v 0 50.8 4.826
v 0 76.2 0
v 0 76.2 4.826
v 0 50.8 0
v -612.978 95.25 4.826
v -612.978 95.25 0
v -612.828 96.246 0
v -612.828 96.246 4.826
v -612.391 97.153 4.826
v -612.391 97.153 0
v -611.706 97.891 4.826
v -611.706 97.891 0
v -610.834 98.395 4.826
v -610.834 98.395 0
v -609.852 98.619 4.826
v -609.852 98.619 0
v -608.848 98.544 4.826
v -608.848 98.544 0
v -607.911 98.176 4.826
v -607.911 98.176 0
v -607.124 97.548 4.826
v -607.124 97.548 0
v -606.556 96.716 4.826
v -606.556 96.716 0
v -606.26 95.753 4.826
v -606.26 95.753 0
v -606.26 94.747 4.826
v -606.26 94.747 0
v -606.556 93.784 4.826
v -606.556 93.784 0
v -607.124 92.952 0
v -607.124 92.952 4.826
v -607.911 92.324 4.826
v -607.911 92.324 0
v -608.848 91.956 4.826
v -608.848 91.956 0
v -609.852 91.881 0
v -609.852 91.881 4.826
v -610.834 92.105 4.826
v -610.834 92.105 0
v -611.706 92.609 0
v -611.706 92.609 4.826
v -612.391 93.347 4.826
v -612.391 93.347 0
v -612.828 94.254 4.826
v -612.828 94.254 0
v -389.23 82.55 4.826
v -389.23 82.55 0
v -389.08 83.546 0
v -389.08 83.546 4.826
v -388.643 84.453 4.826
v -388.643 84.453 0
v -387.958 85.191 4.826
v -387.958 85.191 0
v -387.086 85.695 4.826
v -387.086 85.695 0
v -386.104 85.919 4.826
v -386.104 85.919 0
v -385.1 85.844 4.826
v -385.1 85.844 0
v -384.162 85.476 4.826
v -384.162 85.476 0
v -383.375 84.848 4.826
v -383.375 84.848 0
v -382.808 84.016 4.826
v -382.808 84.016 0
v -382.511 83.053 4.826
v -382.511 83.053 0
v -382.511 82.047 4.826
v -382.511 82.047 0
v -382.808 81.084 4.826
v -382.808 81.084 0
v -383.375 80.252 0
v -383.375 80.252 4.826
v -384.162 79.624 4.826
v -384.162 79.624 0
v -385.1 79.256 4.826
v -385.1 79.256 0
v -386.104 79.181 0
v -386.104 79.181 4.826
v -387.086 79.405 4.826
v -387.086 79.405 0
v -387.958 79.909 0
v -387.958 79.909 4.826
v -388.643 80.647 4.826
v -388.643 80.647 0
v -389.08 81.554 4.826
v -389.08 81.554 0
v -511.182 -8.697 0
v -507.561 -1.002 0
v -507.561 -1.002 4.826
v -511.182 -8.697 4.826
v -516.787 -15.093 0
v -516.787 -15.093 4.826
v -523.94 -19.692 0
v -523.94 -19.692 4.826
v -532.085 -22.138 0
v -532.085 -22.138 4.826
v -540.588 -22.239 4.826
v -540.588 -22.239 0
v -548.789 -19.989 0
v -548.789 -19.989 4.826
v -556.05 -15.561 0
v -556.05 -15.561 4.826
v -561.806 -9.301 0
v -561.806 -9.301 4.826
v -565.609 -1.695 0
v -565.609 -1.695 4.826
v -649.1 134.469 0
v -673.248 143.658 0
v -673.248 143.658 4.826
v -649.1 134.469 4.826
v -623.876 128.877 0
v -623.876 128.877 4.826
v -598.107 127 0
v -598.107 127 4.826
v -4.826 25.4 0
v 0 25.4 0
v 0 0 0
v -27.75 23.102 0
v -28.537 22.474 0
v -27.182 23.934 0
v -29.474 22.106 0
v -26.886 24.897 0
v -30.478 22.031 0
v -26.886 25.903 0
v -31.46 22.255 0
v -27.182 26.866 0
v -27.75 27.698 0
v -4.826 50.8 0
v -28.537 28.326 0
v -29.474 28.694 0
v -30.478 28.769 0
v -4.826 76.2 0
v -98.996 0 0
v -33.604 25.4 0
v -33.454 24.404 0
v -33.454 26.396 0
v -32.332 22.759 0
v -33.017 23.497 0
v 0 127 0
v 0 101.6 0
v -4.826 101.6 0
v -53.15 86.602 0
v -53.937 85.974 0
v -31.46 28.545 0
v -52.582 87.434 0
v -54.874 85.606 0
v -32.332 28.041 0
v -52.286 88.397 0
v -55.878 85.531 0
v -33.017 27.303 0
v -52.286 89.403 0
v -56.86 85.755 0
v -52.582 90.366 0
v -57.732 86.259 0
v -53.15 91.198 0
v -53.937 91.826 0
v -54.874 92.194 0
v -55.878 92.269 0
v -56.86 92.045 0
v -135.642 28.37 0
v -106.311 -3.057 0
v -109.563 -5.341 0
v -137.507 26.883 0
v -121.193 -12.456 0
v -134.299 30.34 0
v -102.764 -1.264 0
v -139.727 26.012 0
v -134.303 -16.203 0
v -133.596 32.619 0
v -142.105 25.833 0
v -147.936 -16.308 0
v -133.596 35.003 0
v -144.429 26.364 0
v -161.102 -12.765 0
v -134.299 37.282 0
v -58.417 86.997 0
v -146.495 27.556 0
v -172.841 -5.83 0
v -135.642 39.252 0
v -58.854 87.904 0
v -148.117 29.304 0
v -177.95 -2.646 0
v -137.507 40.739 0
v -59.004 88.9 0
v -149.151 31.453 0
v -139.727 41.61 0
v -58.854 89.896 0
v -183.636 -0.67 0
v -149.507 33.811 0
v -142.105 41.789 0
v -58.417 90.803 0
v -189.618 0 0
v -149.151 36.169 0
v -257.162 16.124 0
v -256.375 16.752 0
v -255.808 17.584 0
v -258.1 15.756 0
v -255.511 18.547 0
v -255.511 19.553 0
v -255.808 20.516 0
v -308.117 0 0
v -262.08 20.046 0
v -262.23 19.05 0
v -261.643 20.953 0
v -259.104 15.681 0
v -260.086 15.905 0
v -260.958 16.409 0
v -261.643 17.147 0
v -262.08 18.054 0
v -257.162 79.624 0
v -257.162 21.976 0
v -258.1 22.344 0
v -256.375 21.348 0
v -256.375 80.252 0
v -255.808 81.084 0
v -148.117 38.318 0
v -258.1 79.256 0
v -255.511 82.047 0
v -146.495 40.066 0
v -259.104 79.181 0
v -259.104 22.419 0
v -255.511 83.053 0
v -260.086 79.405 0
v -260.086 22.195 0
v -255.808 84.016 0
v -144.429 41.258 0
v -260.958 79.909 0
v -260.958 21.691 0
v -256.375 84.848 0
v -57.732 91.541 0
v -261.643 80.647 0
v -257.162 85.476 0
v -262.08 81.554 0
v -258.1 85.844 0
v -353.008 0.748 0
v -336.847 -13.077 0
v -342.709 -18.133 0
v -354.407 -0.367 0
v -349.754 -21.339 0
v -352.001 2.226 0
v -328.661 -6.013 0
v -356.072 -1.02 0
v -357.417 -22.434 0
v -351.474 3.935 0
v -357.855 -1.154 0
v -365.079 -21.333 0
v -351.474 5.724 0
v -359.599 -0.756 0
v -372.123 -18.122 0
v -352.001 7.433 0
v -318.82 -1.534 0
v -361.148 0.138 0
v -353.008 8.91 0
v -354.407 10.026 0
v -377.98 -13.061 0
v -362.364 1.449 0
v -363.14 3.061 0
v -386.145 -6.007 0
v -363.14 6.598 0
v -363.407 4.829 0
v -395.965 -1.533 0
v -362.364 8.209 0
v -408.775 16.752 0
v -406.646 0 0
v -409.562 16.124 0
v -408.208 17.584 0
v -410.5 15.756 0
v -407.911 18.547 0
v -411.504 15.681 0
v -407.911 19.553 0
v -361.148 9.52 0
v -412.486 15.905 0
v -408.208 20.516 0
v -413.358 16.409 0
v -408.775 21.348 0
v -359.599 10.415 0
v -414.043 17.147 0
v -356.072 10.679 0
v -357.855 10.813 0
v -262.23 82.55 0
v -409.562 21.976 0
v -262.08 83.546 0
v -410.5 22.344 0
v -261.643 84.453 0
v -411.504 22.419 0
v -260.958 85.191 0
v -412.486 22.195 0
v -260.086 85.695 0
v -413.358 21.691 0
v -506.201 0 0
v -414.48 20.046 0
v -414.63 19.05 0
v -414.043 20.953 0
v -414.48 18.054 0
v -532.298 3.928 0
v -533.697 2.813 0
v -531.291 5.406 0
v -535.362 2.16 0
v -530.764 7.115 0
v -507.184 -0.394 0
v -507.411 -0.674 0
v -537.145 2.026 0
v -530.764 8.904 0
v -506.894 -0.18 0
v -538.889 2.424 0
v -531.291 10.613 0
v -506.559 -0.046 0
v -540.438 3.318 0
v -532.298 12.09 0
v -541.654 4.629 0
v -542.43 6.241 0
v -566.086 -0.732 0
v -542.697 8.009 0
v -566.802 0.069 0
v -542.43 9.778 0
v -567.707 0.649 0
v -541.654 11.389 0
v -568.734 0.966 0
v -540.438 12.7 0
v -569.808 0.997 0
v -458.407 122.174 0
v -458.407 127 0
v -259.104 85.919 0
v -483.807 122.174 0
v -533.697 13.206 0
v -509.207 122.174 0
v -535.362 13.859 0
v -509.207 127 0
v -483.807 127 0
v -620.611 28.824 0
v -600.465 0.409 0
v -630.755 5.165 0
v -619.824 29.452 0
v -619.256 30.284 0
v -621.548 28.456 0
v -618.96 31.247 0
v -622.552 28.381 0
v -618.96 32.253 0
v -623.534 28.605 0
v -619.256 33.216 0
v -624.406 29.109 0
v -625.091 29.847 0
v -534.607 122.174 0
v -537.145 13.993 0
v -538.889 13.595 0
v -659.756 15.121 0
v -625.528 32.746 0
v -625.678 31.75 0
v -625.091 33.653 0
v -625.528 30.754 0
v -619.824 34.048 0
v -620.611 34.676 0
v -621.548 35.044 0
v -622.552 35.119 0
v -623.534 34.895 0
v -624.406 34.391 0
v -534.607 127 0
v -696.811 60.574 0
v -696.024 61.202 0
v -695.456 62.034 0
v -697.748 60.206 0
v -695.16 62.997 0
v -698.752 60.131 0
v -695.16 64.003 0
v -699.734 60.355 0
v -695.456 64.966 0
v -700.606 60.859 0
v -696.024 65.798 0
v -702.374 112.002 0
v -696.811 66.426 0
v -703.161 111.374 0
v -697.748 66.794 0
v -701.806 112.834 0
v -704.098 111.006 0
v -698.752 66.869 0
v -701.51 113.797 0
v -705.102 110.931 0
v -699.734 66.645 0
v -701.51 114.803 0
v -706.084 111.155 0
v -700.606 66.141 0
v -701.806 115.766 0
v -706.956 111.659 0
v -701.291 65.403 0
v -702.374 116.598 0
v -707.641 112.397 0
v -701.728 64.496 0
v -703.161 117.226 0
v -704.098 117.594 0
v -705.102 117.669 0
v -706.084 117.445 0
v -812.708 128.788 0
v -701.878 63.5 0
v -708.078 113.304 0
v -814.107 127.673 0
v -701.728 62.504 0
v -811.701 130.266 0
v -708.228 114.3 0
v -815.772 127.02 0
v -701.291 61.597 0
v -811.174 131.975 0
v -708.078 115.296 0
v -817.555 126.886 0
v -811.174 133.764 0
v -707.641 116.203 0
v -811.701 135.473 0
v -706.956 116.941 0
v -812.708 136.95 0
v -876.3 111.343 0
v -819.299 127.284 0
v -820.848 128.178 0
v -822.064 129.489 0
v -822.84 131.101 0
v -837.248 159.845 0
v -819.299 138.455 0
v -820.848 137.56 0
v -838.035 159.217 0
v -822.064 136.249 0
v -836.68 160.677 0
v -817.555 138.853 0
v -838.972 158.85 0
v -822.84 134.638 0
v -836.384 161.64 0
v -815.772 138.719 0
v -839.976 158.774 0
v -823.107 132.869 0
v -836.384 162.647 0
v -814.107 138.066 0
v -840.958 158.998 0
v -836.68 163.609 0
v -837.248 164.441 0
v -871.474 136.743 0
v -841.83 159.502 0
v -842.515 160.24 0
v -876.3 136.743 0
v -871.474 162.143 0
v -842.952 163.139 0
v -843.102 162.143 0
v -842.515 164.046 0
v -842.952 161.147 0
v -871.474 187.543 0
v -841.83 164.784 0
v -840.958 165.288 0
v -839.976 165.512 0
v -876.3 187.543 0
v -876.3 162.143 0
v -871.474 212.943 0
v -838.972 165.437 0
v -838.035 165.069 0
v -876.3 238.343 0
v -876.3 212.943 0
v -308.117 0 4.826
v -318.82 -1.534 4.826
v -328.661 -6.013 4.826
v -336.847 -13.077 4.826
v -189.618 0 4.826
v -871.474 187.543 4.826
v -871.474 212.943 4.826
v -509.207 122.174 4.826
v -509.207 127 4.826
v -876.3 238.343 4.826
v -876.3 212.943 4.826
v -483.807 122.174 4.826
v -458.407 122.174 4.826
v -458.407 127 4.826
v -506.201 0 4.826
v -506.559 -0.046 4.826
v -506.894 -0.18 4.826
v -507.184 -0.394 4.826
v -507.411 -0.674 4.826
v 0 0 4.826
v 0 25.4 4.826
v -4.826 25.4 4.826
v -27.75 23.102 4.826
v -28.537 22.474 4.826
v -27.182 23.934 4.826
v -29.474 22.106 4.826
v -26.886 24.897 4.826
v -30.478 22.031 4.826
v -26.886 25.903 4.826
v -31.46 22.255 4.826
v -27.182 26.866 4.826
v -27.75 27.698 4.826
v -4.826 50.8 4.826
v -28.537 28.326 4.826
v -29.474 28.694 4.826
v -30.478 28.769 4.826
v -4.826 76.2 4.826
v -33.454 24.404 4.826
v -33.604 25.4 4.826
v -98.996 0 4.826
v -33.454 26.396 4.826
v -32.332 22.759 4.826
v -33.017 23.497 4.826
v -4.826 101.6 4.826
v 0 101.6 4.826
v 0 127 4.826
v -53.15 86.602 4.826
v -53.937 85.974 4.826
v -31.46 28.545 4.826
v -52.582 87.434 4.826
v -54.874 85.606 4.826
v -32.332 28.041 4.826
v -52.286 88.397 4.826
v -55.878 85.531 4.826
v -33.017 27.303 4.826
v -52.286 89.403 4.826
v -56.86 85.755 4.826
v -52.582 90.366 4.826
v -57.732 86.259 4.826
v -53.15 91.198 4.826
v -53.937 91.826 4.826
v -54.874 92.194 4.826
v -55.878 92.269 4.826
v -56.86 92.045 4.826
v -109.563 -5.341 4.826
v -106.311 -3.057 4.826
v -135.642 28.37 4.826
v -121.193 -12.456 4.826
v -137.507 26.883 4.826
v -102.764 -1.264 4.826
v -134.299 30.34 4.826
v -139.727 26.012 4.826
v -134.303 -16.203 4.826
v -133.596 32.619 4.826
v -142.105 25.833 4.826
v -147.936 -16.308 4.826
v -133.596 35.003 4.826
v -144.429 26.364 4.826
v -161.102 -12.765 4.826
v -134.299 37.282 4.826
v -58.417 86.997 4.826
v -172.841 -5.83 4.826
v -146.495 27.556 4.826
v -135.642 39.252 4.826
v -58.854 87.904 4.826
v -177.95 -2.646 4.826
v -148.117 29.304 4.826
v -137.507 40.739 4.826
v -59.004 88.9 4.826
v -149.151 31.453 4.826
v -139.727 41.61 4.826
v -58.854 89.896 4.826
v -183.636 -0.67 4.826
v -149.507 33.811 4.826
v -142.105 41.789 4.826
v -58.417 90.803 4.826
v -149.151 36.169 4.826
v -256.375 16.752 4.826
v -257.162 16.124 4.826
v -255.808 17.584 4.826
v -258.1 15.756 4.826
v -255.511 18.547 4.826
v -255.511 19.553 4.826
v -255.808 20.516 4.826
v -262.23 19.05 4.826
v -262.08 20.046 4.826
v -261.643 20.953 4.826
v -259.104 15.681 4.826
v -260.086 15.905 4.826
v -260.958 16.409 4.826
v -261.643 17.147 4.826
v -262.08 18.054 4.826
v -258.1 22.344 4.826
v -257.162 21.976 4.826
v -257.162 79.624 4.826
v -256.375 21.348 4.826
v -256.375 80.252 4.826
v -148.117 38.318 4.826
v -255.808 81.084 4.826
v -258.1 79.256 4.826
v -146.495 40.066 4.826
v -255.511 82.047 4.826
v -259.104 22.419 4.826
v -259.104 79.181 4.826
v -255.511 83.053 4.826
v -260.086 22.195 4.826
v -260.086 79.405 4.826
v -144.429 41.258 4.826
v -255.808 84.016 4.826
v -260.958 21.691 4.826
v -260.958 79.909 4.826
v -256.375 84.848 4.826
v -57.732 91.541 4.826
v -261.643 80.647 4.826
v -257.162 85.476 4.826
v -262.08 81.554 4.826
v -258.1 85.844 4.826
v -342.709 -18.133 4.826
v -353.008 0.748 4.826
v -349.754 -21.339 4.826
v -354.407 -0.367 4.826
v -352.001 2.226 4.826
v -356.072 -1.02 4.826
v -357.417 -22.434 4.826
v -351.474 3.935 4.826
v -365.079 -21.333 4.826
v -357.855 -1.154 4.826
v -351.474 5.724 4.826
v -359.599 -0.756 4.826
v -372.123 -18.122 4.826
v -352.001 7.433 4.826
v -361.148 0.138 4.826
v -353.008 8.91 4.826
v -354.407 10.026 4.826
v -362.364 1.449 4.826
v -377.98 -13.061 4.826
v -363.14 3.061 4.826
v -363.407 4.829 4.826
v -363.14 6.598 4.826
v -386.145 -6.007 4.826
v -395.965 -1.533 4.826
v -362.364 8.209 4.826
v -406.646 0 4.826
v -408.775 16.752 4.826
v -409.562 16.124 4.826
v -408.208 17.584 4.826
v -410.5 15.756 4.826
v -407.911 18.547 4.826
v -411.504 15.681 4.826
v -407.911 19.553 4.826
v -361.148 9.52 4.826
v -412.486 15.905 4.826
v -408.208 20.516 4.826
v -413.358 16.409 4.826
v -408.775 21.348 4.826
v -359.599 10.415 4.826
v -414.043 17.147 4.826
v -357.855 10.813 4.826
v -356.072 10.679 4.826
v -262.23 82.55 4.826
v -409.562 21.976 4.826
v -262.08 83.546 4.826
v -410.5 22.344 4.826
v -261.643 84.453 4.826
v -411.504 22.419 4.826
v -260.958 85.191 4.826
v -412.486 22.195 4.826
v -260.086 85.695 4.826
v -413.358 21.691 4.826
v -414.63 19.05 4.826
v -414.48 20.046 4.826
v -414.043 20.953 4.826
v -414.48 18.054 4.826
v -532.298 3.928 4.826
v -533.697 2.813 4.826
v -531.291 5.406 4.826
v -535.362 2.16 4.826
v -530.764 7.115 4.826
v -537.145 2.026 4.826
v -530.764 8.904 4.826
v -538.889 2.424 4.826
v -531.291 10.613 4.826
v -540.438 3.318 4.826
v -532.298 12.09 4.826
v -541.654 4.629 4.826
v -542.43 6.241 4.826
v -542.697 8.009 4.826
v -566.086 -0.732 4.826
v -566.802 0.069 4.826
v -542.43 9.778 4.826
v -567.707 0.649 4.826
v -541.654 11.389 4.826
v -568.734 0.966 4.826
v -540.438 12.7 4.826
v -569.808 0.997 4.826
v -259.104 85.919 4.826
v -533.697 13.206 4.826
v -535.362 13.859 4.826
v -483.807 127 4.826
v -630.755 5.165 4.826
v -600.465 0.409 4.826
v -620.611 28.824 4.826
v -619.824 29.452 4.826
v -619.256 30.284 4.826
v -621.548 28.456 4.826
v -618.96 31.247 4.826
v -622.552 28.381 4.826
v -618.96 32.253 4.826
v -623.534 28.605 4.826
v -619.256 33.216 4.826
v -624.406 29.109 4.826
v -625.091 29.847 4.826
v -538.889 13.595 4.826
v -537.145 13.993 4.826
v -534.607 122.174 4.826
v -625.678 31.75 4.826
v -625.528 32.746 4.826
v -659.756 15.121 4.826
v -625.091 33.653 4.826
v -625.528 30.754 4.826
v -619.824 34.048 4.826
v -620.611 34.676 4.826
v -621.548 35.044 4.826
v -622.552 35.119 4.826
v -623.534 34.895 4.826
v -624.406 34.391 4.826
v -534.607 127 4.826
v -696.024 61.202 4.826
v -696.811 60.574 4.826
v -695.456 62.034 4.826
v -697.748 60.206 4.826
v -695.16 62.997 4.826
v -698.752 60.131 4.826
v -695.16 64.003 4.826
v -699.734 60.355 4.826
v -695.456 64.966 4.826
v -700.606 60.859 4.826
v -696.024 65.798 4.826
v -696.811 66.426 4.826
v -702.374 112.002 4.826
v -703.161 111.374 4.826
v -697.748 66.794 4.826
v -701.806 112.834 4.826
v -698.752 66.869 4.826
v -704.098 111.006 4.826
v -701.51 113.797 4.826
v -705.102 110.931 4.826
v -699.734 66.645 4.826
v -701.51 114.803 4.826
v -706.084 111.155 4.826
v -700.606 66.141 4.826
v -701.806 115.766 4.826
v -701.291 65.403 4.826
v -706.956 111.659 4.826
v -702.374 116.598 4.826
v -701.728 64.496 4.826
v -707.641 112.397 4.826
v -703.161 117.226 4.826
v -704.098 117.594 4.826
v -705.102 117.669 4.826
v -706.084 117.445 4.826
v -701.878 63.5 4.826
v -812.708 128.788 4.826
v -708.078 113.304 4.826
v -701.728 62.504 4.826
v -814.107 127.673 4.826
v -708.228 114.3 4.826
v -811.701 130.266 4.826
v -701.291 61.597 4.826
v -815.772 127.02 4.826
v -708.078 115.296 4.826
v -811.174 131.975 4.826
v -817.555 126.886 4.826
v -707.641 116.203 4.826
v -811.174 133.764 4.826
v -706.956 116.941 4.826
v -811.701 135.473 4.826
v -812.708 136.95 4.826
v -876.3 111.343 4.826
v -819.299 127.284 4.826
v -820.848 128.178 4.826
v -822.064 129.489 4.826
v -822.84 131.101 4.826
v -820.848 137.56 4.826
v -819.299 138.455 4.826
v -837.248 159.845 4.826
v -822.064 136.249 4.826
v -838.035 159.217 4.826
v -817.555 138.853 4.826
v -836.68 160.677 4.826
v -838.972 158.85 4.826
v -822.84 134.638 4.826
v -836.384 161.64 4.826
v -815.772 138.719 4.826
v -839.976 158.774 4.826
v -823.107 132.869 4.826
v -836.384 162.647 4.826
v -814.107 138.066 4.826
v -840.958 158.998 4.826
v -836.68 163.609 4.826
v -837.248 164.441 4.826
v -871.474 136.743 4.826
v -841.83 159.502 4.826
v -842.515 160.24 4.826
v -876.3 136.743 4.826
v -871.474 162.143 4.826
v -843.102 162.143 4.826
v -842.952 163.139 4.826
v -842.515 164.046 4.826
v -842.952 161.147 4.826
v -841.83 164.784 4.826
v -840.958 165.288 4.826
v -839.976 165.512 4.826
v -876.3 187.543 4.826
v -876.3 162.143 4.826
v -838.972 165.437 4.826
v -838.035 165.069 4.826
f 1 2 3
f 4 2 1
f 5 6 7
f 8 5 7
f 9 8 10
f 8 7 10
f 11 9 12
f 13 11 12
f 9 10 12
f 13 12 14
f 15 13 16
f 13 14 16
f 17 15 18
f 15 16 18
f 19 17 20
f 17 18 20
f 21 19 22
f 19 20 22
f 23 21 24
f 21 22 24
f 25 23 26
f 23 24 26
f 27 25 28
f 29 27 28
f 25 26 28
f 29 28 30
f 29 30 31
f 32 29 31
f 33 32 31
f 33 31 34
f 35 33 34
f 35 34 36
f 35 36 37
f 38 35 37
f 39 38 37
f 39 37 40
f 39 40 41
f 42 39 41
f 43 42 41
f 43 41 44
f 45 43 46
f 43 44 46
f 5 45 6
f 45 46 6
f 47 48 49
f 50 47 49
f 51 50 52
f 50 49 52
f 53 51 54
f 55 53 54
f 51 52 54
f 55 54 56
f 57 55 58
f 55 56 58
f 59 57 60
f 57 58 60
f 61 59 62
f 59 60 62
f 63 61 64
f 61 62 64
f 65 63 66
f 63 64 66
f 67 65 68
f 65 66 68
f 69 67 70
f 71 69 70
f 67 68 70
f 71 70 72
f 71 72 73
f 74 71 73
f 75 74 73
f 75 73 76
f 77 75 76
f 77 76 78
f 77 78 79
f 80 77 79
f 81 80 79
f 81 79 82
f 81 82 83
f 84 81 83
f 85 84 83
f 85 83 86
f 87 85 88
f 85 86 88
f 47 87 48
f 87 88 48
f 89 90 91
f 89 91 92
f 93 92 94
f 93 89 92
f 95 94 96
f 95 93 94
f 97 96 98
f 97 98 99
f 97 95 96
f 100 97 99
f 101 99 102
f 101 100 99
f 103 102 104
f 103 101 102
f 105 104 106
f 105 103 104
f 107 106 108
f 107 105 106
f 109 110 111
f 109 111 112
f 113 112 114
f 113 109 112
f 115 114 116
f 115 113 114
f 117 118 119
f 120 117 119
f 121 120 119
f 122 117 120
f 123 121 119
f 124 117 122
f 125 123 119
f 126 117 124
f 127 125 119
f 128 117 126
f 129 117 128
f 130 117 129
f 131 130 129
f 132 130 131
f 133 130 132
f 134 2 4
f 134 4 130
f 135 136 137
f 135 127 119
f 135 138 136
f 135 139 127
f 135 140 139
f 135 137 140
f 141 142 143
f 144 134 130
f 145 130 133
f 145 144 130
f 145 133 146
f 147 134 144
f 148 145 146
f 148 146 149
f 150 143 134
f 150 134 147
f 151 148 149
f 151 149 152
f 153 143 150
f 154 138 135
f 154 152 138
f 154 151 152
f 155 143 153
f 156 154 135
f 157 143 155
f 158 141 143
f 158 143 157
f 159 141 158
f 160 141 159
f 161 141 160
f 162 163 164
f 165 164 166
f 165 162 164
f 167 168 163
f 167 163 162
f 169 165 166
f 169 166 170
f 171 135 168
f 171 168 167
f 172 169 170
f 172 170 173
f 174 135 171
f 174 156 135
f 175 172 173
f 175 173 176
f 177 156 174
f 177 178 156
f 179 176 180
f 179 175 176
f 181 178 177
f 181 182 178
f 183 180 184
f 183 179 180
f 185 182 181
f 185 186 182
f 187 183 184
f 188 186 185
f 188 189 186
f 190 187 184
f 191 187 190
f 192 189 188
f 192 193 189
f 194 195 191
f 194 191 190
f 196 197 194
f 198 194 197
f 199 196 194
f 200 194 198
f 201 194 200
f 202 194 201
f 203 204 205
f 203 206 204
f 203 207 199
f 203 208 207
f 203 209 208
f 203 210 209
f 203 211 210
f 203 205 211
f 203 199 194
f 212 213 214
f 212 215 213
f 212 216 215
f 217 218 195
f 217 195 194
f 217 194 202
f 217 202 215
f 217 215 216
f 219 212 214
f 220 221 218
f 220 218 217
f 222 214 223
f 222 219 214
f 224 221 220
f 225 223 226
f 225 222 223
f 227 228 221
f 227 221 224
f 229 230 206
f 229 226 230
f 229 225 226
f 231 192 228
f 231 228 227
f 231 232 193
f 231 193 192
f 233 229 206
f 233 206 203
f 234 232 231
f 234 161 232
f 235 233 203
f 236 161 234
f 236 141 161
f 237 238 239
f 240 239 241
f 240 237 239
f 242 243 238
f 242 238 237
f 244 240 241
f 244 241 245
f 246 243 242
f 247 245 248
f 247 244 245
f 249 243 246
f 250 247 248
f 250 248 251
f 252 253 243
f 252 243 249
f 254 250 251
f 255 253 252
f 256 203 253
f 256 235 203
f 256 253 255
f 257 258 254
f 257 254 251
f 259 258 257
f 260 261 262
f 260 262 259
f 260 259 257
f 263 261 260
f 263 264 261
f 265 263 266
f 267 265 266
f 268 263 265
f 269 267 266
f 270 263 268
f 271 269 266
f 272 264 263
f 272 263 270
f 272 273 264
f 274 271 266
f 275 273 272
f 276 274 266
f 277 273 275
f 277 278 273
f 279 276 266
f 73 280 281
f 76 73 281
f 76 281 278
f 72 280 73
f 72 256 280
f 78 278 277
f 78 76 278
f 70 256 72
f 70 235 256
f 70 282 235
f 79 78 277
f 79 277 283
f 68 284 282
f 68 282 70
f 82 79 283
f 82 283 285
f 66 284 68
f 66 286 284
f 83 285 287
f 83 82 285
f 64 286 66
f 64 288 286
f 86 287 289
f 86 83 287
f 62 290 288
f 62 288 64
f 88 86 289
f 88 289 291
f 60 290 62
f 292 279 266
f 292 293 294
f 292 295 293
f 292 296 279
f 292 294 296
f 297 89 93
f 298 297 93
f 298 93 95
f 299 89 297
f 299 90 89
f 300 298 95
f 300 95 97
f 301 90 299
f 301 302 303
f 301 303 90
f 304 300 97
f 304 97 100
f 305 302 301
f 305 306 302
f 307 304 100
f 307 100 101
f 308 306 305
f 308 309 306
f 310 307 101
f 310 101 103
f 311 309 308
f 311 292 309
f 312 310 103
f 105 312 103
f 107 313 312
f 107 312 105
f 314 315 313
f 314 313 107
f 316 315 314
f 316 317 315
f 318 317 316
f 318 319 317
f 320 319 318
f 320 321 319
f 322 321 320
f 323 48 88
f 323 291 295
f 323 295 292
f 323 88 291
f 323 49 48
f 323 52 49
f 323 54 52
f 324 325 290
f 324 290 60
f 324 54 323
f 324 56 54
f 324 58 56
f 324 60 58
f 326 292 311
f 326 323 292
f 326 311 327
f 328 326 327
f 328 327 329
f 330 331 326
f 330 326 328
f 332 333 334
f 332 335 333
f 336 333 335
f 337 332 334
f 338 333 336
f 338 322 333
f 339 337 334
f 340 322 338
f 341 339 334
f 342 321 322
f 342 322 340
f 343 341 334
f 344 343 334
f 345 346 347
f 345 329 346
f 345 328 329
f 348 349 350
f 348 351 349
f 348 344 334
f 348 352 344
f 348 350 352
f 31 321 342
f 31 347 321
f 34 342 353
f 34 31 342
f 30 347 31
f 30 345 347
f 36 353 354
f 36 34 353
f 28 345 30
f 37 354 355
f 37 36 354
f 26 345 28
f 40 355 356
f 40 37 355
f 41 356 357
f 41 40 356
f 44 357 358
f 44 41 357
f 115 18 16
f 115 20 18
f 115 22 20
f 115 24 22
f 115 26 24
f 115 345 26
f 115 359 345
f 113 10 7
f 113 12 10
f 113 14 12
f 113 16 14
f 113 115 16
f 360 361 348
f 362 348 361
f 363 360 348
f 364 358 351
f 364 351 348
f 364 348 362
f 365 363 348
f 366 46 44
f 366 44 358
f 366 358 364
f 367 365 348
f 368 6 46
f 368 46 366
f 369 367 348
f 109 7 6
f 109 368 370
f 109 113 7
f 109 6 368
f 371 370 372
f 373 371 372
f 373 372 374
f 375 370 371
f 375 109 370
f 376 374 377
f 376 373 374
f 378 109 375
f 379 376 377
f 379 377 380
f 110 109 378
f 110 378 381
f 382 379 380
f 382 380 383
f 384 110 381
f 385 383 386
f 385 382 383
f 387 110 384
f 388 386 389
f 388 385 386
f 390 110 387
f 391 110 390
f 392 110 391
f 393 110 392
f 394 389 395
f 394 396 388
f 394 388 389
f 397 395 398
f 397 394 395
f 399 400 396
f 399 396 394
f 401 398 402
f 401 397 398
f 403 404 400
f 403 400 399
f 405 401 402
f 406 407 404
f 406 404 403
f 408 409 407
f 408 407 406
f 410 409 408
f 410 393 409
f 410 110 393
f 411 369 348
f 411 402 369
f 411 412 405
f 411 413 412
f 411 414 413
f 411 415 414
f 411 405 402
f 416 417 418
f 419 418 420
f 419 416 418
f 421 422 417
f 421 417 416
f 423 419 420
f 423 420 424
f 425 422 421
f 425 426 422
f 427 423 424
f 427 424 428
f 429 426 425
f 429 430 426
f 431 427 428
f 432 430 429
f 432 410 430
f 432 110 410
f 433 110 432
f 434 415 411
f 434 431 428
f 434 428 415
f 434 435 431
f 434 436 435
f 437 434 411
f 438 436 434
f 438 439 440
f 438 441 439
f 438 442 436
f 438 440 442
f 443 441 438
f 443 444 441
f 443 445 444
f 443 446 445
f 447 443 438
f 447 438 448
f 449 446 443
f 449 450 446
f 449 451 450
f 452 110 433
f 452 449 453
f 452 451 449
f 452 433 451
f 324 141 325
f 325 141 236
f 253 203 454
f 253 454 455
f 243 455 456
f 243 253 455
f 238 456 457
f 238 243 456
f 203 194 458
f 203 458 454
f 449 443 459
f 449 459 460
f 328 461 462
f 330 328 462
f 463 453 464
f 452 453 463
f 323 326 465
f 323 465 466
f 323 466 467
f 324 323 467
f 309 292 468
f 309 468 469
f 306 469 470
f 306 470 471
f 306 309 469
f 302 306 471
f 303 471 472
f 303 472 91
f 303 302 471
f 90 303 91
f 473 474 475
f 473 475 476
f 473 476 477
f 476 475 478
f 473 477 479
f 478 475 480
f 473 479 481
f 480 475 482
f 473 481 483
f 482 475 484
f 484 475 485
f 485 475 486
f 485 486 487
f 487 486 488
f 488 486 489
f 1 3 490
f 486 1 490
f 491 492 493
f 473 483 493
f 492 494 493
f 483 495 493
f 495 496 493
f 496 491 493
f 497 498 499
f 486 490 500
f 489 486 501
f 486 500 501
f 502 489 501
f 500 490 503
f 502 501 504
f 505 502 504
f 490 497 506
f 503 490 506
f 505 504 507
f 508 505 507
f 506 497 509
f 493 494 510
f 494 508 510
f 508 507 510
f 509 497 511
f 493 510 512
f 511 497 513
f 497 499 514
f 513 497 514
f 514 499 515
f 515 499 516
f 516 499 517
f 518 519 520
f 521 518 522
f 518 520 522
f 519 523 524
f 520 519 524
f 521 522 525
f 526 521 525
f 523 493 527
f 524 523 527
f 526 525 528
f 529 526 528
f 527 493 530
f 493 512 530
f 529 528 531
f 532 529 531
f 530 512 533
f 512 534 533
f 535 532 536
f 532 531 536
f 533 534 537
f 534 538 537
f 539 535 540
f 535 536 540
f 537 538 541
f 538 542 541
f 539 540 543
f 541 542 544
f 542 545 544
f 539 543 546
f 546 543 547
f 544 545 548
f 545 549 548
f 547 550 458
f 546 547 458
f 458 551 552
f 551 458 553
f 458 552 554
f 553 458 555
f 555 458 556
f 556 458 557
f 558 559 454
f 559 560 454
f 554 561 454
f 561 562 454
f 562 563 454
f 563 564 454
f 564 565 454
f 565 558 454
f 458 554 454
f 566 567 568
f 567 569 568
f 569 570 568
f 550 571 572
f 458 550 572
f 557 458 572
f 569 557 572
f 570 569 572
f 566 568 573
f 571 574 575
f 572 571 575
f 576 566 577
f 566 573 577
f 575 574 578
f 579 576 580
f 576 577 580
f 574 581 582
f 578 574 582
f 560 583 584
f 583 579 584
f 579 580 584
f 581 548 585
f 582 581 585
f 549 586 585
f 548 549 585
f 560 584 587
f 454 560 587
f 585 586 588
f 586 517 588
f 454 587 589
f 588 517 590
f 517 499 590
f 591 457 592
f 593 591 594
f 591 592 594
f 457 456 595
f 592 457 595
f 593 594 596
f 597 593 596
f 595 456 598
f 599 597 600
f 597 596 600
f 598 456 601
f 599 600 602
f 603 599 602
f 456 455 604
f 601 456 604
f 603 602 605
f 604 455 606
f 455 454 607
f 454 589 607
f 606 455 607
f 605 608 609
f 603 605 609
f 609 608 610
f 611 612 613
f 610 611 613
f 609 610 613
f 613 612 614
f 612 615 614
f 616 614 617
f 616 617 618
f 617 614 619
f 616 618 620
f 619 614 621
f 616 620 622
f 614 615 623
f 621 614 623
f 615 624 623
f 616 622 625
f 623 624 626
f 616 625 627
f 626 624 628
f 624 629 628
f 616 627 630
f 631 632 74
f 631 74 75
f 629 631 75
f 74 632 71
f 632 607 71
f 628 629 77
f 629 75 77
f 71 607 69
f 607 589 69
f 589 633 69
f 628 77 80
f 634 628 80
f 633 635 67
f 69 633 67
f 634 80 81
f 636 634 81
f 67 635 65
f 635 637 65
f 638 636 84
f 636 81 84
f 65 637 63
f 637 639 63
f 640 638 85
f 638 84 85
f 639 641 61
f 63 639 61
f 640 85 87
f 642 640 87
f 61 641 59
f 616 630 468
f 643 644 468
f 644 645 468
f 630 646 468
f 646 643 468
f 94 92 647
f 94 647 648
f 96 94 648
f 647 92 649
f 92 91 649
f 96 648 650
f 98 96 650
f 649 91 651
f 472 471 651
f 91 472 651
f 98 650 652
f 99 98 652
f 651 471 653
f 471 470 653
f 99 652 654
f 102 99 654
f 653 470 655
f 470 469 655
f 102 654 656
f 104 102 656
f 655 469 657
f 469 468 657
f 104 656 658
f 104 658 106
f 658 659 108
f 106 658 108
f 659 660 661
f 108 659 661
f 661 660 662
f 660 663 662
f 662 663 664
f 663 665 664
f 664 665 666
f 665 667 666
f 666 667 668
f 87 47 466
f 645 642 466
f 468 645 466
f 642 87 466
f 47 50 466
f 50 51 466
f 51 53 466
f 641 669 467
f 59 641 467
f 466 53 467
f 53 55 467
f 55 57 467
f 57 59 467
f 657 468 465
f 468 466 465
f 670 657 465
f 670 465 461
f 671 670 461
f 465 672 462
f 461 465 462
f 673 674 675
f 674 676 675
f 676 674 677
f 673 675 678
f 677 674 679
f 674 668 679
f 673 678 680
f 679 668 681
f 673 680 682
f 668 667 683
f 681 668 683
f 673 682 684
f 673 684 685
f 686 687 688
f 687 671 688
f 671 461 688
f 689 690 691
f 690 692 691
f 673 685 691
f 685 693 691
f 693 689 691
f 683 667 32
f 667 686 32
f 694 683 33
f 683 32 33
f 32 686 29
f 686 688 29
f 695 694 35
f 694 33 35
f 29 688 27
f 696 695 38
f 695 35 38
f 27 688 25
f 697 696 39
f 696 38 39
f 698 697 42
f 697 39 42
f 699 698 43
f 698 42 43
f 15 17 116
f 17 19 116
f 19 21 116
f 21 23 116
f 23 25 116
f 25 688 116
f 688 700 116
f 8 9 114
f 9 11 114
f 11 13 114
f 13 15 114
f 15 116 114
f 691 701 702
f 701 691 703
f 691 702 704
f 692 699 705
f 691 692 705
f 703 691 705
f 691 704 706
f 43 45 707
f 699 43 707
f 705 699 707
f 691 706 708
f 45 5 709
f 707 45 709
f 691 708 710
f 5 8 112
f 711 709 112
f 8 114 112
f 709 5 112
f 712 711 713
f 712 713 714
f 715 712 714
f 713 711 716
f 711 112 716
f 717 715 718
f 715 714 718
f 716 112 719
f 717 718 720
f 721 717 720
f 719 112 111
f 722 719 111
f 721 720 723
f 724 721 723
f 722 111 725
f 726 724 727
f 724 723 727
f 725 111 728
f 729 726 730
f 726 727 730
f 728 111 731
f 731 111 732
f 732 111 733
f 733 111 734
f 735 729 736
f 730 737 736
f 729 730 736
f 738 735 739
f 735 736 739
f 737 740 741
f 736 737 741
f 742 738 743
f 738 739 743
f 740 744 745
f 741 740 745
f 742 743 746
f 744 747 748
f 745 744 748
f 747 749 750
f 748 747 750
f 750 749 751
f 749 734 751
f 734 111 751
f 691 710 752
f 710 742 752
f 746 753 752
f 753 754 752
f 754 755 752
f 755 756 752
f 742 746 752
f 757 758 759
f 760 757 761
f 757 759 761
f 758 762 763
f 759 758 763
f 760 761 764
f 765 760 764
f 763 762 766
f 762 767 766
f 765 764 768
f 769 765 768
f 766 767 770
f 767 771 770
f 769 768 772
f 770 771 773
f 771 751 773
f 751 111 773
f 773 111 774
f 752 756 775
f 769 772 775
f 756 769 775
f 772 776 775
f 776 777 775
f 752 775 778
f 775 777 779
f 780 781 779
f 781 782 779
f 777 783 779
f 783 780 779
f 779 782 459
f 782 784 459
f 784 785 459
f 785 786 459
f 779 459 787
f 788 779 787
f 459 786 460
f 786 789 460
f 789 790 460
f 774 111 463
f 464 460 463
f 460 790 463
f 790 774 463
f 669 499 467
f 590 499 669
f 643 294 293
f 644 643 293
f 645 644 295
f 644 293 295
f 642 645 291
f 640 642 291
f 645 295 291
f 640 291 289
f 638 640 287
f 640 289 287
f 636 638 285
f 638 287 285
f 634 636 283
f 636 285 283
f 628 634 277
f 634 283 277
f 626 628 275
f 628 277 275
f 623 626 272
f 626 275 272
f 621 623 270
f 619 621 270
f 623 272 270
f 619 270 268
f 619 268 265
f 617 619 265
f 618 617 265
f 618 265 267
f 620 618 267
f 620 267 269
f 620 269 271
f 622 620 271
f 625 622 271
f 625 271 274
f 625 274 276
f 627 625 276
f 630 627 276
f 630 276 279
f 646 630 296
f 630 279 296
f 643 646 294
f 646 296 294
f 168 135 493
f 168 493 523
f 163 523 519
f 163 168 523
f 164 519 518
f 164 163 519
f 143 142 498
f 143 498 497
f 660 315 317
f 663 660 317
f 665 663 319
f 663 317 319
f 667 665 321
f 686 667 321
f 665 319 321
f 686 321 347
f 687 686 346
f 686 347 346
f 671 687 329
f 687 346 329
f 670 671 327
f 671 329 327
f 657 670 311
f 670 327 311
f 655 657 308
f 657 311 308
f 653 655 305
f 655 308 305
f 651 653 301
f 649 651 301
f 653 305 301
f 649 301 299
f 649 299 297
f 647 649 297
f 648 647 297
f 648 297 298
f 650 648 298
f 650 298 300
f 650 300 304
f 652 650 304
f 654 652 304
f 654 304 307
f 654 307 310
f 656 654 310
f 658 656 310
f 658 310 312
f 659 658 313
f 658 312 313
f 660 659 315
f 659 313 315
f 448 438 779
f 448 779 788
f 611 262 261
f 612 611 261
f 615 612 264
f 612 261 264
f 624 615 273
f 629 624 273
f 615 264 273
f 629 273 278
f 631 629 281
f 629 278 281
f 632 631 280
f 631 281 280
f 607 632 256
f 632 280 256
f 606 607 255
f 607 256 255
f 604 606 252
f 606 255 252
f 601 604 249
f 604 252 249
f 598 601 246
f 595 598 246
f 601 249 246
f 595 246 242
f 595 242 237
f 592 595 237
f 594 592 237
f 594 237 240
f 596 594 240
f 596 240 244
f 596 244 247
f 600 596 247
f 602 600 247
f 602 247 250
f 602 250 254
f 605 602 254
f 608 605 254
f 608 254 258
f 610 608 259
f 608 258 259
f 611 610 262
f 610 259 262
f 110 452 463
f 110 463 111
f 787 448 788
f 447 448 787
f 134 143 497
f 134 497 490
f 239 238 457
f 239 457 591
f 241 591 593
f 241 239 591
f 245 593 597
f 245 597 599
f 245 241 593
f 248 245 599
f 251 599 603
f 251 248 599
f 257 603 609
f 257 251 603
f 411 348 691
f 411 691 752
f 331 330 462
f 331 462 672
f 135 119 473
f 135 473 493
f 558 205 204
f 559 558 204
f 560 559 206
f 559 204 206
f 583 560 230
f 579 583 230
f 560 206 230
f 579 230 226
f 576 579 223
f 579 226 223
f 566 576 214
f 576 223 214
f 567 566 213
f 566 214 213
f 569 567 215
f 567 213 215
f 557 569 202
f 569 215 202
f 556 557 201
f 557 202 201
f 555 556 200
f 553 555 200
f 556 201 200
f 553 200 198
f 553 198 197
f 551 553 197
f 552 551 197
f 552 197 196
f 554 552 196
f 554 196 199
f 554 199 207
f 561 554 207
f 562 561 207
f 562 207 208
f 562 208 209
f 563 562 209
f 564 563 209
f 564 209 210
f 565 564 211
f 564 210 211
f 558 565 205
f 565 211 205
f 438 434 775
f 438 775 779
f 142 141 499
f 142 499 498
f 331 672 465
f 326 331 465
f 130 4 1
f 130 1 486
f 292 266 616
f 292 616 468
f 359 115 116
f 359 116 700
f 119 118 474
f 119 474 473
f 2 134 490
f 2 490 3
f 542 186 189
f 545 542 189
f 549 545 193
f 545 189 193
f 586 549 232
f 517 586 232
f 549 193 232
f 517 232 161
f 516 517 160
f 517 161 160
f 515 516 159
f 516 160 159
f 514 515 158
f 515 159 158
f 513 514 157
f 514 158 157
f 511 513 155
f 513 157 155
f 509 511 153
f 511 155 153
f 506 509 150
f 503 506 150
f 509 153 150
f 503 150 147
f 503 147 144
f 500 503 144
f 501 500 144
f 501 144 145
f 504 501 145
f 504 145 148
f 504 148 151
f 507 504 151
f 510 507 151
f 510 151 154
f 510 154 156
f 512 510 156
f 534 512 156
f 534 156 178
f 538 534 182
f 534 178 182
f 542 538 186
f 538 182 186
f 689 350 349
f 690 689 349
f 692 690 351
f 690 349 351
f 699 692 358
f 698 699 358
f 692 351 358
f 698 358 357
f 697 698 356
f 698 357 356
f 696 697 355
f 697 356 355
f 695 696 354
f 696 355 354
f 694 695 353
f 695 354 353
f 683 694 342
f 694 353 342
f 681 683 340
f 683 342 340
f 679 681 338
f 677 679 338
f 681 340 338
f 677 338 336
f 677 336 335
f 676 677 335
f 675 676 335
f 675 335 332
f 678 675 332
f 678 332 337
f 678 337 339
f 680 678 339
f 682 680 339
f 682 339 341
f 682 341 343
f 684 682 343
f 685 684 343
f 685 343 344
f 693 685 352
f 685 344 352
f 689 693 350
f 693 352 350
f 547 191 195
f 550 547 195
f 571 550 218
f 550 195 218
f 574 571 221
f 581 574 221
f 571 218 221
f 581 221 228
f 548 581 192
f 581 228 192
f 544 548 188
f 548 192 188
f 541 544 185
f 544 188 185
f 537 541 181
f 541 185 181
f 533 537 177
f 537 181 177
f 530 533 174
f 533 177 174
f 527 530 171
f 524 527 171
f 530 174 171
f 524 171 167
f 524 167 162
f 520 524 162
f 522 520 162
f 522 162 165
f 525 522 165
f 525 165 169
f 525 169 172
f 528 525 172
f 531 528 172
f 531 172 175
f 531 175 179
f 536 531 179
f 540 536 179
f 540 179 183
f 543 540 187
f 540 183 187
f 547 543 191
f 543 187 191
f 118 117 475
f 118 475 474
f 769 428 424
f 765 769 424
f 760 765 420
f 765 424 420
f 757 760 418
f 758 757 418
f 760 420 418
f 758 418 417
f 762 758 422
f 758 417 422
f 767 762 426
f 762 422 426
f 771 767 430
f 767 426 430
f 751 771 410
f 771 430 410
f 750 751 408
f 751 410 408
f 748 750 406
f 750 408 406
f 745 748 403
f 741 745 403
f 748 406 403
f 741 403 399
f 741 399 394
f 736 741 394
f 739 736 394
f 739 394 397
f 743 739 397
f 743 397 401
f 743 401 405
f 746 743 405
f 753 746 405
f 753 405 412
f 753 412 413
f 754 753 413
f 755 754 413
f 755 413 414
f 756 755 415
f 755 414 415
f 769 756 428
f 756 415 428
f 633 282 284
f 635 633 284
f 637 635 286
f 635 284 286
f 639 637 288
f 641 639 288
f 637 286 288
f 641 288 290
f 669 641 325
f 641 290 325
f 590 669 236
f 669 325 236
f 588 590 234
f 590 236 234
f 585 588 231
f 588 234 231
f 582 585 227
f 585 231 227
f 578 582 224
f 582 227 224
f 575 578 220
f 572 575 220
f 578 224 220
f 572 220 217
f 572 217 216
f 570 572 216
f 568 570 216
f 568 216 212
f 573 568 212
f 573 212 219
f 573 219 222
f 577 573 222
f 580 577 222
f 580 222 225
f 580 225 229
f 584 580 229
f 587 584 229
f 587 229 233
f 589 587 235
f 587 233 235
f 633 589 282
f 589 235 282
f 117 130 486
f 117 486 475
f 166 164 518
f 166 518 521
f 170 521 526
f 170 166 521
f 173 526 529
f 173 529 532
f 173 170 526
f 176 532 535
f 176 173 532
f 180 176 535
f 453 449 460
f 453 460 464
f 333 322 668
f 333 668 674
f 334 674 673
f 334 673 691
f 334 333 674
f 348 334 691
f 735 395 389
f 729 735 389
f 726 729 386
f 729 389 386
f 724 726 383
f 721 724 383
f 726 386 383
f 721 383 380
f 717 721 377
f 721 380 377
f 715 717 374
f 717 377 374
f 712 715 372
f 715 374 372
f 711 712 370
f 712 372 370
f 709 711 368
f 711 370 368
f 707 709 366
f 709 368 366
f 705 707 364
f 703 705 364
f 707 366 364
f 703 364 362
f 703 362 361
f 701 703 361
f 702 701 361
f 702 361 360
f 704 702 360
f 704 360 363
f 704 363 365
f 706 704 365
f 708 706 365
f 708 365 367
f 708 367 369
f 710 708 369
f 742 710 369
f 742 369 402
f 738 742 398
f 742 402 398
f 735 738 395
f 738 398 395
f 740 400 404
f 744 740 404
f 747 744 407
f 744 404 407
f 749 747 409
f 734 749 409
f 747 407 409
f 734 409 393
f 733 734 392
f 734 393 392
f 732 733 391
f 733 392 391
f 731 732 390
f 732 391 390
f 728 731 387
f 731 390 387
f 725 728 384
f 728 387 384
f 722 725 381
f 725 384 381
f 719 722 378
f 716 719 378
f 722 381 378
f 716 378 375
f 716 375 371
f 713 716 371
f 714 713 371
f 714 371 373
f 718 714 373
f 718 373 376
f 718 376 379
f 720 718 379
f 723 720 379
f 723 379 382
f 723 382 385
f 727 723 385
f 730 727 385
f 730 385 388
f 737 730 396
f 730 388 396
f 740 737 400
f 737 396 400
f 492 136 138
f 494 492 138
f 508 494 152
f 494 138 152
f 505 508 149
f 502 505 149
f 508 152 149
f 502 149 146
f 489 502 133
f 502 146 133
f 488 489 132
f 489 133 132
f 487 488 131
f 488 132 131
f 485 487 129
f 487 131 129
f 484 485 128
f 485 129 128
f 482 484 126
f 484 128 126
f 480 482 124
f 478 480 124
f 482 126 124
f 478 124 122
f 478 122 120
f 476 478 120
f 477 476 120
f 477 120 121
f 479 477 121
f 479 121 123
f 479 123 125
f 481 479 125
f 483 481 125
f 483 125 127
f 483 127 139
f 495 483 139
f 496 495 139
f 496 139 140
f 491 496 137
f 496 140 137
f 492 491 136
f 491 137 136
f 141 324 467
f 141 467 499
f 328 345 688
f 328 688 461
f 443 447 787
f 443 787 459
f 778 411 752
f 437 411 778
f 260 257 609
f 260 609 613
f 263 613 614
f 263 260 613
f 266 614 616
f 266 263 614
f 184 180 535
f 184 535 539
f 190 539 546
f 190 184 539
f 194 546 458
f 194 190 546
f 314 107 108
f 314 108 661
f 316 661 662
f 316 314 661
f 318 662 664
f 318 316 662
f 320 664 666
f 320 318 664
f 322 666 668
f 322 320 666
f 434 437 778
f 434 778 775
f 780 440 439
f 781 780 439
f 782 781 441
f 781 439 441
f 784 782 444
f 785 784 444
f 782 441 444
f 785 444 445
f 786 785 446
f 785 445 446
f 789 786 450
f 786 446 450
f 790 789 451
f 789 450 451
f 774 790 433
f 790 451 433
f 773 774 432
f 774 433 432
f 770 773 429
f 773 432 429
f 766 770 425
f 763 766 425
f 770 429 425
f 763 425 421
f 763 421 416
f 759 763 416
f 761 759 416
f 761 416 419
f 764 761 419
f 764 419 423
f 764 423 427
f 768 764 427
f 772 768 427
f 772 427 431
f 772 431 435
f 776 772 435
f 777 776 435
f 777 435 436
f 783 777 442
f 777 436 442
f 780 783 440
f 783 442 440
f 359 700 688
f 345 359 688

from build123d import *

# Parameters (mm, degrees)
SKETCH1_R           = 3.3782
SKETCH1_R_2         = 8.000000002
SKETCH1_R_3         = 5.999999989
SKETCH1_R_4         = 5.999999988
SKETCH1_R_5         = 6.000000014
BOSS_EXTRUDE1_DEPTH = 4.826


with BuildPart() as part:
    # Sketch1 → Boss-Extrude1 (new body)
    with BuildSketch(Plane(origin=(0, 0, 0), x_dir=(-1, 0, 0), z_dir=(0, 0, -1))):
        with BuildLine():
            Line((534.606732, 122.174), (509.206732, 122.174))
            Line((509.206732, 122.174), (509.206732, 127))
            Line((509.206732, 127), (483.806732, 127))
            Line((483.806732, 127), (483.806732, 122.174))
            Line((483.806732, 122.174), (458.406732, 122.174))
            Line((458.406732, 122.174), (458.406732, 127))
            Line((458.406732, 127), (0, 127))
            Line((0, 127), (0, 101.6))
            Line((0, 101.6), (4.826, 101.6))
            Line((4.826, 101.6), (4.826, 76.2))
            Line((4.826, 76.2), (0, 76.2))
            Line((0, 76.2), (0, 50.8))
            Line((0, 50.8), (4.826, 50.8))
            Line((4.826, 50.8), (4.826, 25.4))
            Line((4.826, 25.4), (0, 25.4))
            Line((0, 25.4), (0, 0))
            Line((0, 0), (98.996246628, 0))
            ThreePointArc((98.996246628, 0), (104.569566166, -2.09646468), (109.562810755, -5.340623016))
            ThreePointArc((109.562810755, -5.340623016), (141.115933183, -16.717309509), (172.841249368, -5.830030532))
            ThreePointArc((172.841249368, -5.830030532), (180.737693875, -1.499037017), (189.618247276, 0))
            Line((189.618247276, 0), (308.116822983, 0))
            ThreePointArc((308.116822983, 0), (323.900159152, -3.422971591), (336.847489477, -13.076834684))
            ThreePointArc((336.847489477, -13.076834684), (357.417237927, -22.434421933), (377.979766443, -13.060980118))
            ThreePointArc((377.979766443, -13.060980118), (390.895425815, -3.419107464), (406.646288314, 0))
            Line((406.646288314, 0), (506.201416447, 0))
            ThreePointArc((506.201416447, 0), (507.045954934, -0.277722975), (507.560830812, -1.002483719))
            ThreePointArc((507.560830812, -1.002483719), (536.332746766, -22.486228157), (565.609234573, -1.69532427))
            ThreePointArc((565.609234573, -1.69532427), (567.234956908, 0.389735568), (569.808214418, 0.997019206))
            ThreePointArc((569.808214418, 0.997019206), (615.71405842, 2.124494779), (659.756153394, 15.121093757))
            Line((659.756153394, 15.121093757), (876.299999975, 111.343057166))
            Line((876.299999975, 111.343057166), (876.299999975, 136.743057212))
            Line((876.299999975, 136.743057212), (871.47400014, 136.743057212))
            Line((871.47400014, 136.743057212), (871.47400014, 162.143057105))
            Line((871.47400014, 162.143057105), (876.299999975, 162.143057105))
            Line((876.299999975, 162.143057105), (876.299999975, 187.543057156))
            Line((876.299999975, 187.543057156), (871.47400014, 187.543057156))
            Line((871.47400014, 187.543057156), (871.47400014, 212.943057198))
            Line((871.47400014, 212.943057198), (876.299999975, 212.943057198))
            Line((876.299999975, 212.943057198), (876.299999975, 238.343057355))
            Line((876.299999975, 238.343057355), (673.248258968, 143.658475478))
            ThreePointArc((673.248258968, 143.658475478), (636.589695375, 131.214569938), (598.106732, 127))
            Line((598.106732, 127), (534.606732, 127))
            Line((534.606732, 127), (534.606732, 122.174))
        make_face()
        with Locations((698.5, 63.500000033)):
            Circle(SKETCH1_R, mode=Mode.SUBTRACT)
        with Locations((704.85, 114.300000033)):
            Circle(SKETCH1_R, mode=Mode.SUBTRACT)
        with Locations((30.226, 25.400000033)):
            Circle(SKETCH1_R, mode=Mode.SUBTRACT)
        with Locations((622.3, 31.750000033)):
            Circle(SKETCH1_R, mode=Mode.SUBTRACT)
        with Locations((411.2514, 19.050000033)):
            Circle(SKETCH1_R, mode=Mode.SUBTRACT)
        with Locations((385.8514, 82.550000033)):
            Circle(SKETCH1_R, mode=Mode.SUBTRACT)
        with Locations((258.8514, 82.550000033)):
            Circle(SKETCH1_R, mode=Mode.SUBTRACT)
        with Locations((258.8514, 19.050000033)):
            Circle(SKETCH1_R, mode=Mode.SUBTRACT)
        with Locations((55.626, 88.900000033)):
            Circle(SKETCH1_R, mode=Mode.SUBTRACT)
        with Locations((609.6, 95.250000033)):
            Circle(SKETCH1_R, mode=Mode.SUBTRACT)
        with Locations((839.724, 162.143057153)):
            Circle(SKETCH1_R, mode=Mode.SUBTRACT)
        with Locations((141.506729012, 33.811031431)):
            Circle(SKETCH1_R_2, mode=Mode.SUBTRACT)
        with Locations((357.406729012, 4.829371893)):
            Circle(SKETCH1_R_3, mode=Mode.SUBTRACT)
        with Locations((536.696729012, 8.009371893)):
            Circle(SKETCH1_R_4, mode=Mode.SUBTRACT)
        with Locations((817.106729012, 132.869371893)):
            Circle(SKETCH1_R_5, mode=Mode.SUBTRACT)
    extrude(amount=-BOSS_EXTRUDE1_DEPTH)


solid = part.part
